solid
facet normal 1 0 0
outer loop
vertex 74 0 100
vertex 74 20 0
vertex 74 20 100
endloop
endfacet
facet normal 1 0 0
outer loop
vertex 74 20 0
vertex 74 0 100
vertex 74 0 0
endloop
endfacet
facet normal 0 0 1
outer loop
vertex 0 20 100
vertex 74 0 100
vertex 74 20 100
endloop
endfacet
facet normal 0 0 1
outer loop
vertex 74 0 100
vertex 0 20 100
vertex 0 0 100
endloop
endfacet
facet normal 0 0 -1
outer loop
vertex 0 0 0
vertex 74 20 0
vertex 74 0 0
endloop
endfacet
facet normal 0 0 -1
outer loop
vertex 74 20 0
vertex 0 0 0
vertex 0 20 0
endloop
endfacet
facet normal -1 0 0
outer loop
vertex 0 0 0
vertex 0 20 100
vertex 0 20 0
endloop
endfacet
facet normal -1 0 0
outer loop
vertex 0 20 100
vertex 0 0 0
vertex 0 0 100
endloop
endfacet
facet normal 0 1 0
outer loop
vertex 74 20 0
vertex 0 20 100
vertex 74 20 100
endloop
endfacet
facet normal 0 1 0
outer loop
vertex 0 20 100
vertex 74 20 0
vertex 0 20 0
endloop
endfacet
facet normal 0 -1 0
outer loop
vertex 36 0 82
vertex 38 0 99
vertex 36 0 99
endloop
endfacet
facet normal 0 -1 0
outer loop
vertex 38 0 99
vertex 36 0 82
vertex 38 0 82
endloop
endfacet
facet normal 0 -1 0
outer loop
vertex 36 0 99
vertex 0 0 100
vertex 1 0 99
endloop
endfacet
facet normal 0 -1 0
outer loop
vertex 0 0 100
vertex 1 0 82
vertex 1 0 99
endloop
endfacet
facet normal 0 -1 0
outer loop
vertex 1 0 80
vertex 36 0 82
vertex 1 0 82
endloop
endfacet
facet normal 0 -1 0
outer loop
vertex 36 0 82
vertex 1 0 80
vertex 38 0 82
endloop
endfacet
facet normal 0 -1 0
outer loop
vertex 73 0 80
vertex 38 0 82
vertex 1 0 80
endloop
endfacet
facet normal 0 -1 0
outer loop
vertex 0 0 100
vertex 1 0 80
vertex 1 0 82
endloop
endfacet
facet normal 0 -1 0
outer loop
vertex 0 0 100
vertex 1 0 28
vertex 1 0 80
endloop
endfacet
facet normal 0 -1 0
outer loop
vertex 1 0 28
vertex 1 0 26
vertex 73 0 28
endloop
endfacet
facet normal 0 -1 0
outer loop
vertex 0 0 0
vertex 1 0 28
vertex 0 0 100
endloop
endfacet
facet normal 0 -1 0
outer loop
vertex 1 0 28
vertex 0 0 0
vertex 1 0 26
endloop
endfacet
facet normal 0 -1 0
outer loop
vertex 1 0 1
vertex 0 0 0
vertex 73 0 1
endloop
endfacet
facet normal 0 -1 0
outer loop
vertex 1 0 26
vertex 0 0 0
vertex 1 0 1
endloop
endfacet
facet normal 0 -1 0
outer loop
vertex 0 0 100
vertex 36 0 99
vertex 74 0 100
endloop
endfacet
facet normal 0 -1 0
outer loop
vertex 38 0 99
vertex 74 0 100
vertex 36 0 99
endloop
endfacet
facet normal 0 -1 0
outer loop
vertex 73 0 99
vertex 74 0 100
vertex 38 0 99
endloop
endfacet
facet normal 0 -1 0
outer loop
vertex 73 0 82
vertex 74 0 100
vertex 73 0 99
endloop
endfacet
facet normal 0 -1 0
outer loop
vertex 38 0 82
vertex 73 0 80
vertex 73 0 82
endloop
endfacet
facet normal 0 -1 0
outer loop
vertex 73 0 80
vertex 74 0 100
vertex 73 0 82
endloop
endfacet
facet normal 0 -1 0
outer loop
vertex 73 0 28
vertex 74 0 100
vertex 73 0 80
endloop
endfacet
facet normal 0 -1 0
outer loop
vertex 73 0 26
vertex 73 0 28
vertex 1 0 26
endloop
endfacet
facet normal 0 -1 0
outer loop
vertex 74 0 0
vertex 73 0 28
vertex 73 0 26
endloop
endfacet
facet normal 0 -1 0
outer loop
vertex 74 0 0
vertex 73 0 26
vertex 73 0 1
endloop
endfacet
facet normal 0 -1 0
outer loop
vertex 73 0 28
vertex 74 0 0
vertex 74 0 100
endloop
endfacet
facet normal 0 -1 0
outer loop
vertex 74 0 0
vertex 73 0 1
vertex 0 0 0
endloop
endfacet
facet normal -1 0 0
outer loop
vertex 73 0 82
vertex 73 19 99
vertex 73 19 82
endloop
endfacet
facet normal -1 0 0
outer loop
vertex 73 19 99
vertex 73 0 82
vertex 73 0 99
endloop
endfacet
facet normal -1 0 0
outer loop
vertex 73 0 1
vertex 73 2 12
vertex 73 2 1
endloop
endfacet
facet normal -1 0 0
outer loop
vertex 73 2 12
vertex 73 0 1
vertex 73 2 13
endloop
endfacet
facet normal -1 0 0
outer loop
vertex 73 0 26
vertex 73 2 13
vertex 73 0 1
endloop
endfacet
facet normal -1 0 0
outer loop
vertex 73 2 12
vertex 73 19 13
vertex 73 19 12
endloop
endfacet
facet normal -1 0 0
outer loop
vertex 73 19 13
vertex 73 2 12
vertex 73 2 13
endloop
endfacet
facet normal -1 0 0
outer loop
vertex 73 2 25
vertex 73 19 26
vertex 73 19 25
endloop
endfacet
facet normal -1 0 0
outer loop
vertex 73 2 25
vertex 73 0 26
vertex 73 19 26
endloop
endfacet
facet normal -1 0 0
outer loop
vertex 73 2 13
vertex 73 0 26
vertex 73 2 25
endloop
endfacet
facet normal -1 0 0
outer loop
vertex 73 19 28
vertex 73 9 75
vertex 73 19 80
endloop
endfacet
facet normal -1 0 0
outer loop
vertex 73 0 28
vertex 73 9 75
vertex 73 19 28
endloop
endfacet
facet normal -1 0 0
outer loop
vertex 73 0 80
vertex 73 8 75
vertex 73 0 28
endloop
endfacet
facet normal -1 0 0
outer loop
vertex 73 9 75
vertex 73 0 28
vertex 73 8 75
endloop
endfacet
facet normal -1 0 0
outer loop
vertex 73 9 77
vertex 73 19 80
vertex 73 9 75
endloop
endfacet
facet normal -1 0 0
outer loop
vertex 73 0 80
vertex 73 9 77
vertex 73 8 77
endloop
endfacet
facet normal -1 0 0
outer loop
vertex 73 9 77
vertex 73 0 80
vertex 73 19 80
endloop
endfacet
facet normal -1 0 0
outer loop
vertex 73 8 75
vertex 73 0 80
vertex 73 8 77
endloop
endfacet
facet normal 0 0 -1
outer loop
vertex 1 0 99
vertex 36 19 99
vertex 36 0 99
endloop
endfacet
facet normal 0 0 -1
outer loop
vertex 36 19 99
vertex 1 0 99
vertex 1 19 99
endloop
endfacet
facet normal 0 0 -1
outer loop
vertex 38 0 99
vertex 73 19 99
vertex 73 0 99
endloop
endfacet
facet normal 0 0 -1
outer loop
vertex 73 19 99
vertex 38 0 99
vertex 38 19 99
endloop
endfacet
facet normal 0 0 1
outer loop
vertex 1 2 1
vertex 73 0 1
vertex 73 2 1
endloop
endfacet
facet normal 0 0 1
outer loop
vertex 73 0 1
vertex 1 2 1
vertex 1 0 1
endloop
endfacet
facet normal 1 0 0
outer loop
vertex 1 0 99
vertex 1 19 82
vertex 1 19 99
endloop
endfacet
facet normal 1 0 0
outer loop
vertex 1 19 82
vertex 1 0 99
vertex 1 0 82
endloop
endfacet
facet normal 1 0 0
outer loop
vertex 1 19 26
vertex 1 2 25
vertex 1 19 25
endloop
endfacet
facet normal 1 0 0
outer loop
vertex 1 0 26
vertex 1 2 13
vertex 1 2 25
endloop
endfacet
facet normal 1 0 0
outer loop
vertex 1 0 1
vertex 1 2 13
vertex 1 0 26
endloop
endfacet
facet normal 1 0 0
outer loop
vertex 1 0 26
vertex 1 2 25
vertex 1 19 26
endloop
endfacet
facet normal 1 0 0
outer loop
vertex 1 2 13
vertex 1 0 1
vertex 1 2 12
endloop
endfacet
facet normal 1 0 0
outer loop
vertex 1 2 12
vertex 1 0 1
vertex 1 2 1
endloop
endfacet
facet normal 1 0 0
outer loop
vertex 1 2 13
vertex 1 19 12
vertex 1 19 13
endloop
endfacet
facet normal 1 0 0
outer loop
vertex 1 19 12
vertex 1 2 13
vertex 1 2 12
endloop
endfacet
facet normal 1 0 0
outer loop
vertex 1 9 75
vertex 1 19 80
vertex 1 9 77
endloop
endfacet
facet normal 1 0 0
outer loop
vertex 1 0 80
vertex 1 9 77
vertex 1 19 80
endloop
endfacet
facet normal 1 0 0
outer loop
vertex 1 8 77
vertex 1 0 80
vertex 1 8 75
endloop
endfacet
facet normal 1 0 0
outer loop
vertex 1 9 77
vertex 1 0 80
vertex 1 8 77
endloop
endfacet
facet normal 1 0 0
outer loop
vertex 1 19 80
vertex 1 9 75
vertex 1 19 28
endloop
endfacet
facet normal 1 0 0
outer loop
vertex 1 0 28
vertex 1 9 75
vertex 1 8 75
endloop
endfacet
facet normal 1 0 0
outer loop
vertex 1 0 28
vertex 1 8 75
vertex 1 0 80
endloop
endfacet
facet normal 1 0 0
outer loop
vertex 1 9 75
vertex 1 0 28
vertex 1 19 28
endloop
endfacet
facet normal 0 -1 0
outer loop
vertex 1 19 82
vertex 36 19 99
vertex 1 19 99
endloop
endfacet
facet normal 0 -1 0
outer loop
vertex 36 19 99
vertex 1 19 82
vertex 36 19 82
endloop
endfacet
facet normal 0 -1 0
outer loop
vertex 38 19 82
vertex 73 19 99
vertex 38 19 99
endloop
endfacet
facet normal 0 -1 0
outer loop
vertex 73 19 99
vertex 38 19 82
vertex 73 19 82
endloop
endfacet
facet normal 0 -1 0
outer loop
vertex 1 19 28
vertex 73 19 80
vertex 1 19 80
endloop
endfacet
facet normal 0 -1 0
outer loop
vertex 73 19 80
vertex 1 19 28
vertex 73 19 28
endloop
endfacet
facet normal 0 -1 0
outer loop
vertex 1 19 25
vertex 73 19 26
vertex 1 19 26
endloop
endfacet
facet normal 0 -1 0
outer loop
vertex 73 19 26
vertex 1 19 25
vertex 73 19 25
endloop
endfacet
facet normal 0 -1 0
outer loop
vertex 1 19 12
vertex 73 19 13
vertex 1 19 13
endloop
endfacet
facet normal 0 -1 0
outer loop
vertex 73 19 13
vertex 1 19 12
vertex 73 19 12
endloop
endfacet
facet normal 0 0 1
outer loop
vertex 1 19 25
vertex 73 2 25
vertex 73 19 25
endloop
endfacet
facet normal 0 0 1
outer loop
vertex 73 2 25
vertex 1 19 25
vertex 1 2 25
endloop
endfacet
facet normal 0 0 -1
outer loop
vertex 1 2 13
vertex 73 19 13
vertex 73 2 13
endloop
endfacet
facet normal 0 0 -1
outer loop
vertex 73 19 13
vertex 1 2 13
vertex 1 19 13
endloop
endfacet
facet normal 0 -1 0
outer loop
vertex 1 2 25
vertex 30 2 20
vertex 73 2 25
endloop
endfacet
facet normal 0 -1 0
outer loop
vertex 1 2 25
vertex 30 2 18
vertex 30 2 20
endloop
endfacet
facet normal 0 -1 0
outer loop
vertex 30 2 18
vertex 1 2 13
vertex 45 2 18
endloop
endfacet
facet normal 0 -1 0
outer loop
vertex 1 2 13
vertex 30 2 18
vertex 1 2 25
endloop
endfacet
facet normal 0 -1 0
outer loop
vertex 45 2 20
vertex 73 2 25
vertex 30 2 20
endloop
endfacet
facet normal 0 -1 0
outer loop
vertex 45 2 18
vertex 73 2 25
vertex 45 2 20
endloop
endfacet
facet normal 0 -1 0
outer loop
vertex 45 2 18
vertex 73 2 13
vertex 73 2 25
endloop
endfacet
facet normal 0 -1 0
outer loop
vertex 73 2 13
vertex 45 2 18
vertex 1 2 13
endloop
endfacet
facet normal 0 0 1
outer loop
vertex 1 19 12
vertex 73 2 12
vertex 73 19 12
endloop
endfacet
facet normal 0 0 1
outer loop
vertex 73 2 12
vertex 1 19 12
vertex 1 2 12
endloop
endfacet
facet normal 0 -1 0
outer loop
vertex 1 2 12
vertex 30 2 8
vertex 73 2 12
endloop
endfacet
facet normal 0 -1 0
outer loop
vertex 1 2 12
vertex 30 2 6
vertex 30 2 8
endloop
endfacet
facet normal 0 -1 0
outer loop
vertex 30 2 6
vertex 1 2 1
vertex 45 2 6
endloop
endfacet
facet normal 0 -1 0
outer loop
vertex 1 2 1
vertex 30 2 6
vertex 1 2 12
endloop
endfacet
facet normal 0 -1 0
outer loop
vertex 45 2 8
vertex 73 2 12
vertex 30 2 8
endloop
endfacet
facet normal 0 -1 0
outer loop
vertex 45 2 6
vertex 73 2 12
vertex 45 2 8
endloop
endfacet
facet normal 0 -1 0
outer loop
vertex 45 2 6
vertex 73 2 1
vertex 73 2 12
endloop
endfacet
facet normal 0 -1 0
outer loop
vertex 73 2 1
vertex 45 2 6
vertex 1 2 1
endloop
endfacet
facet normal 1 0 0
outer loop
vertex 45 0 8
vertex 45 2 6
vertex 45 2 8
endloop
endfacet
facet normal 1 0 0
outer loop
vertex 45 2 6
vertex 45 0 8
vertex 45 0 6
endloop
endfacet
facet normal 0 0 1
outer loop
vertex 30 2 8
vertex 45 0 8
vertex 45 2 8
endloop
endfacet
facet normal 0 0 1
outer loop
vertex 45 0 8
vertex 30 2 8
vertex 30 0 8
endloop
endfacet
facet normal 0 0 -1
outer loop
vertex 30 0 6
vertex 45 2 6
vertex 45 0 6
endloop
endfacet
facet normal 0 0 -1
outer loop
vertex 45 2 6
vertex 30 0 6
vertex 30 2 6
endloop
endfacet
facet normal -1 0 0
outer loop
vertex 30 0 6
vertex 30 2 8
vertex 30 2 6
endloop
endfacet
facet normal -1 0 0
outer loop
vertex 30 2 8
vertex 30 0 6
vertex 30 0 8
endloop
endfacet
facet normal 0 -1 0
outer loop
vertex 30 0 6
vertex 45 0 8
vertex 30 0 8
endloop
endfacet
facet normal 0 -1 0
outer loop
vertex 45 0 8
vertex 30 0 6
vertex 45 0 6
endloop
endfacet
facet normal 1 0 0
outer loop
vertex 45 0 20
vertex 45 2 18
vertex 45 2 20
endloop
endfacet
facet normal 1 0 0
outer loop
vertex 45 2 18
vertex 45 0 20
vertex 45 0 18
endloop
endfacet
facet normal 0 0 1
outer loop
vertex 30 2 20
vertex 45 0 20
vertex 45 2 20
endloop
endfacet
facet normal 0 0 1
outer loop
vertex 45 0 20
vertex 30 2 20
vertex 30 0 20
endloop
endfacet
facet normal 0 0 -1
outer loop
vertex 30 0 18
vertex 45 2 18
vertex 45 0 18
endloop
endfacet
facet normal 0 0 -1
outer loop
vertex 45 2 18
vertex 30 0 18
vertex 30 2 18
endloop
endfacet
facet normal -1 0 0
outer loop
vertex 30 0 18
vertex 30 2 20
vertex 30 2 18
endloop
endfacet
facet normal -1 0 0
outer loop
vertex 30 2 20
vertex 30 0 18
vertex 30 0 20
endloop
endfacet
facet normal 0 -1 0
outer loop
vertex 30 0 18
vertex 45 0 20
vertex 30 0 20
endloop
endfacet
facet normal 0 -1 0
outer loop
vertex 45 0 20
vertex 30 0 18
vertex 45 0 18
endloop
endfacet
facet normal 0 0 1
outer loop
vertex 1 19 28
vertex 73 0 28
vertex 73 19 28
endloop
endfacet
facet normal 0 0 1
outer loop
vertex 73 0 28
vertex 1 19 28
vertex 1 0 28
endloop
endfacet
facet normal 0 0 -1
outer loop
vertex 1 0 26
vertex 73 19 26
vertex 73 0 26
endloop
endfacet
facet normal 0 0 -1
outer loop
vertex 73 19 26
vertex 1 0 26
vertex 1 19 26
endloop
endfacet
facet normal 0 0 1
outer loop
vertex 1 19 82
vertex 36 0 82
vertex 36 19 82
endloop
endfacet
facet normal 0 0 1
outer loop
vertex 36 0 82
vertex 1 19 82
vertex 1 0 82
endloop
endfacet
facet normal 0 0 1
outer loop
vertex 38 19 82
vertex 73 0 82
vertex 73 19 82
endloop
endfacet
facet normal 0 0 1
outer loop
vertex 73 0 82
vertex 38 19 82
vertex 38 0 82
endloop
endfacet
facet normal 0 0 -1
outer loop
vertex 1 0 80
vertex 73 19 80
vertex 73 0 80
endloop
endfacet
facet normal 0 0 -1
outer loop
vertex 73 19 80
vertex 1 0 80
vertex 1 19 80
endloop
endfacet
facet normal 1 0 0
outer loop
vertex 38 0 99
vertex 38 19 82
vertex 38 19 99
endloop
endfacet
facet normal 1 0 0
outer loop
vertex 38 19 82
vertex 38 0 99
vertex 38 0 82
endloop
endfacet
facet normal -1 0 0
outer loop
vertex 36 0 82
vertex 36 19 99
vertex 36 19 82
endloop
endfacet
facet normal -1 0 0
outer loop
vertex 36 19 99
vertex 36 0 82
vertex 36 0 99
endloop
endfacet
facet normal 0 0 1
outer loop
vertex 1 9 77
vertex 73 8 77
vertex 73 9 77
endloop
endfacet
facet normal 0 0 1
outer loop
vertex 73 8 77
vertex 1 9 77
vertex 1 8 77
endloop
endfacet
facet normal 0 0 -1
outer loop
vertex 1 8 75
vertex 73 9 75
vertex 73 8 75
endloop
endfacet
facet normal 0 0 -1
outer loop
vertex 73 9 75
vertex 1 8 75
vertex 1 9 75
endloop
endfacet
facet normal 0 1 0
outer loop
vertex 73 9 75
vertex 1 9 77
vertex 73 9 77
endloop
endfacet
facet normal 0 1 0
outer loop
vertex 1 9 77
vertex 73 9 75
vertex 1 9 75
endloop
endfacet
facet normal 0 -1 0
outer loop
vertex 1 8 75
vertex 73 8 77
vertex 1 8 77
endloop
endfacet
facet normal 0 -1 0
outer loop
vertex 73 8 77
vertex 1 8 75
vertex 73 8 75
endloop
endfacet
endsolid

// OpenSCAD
//Estructura

difference(){
    
    cube([74,20,100]);
    translate ([1,0,1])
    cube([72,19,98]);
} 

//calaixos

translate ([0,2,13])
cube([74,17,12]);
translate ([0,2,0])
cube([74,17,12]);

//tiradores
translate([30,0,6])
cube([15,3,2]);

translate([30,0,18])
cube([15,3,2]);

//placa a sobre dels calaixos

translate([0,0,26])
cube([74,19,2]);


//armariets d'adalt

translate ([0,0,80])
cube([74,19,2]);

translate([36,0,80])
cube([2,20,20]);


//barra

translate ([0,8,75])
cube([74,1,2]);
